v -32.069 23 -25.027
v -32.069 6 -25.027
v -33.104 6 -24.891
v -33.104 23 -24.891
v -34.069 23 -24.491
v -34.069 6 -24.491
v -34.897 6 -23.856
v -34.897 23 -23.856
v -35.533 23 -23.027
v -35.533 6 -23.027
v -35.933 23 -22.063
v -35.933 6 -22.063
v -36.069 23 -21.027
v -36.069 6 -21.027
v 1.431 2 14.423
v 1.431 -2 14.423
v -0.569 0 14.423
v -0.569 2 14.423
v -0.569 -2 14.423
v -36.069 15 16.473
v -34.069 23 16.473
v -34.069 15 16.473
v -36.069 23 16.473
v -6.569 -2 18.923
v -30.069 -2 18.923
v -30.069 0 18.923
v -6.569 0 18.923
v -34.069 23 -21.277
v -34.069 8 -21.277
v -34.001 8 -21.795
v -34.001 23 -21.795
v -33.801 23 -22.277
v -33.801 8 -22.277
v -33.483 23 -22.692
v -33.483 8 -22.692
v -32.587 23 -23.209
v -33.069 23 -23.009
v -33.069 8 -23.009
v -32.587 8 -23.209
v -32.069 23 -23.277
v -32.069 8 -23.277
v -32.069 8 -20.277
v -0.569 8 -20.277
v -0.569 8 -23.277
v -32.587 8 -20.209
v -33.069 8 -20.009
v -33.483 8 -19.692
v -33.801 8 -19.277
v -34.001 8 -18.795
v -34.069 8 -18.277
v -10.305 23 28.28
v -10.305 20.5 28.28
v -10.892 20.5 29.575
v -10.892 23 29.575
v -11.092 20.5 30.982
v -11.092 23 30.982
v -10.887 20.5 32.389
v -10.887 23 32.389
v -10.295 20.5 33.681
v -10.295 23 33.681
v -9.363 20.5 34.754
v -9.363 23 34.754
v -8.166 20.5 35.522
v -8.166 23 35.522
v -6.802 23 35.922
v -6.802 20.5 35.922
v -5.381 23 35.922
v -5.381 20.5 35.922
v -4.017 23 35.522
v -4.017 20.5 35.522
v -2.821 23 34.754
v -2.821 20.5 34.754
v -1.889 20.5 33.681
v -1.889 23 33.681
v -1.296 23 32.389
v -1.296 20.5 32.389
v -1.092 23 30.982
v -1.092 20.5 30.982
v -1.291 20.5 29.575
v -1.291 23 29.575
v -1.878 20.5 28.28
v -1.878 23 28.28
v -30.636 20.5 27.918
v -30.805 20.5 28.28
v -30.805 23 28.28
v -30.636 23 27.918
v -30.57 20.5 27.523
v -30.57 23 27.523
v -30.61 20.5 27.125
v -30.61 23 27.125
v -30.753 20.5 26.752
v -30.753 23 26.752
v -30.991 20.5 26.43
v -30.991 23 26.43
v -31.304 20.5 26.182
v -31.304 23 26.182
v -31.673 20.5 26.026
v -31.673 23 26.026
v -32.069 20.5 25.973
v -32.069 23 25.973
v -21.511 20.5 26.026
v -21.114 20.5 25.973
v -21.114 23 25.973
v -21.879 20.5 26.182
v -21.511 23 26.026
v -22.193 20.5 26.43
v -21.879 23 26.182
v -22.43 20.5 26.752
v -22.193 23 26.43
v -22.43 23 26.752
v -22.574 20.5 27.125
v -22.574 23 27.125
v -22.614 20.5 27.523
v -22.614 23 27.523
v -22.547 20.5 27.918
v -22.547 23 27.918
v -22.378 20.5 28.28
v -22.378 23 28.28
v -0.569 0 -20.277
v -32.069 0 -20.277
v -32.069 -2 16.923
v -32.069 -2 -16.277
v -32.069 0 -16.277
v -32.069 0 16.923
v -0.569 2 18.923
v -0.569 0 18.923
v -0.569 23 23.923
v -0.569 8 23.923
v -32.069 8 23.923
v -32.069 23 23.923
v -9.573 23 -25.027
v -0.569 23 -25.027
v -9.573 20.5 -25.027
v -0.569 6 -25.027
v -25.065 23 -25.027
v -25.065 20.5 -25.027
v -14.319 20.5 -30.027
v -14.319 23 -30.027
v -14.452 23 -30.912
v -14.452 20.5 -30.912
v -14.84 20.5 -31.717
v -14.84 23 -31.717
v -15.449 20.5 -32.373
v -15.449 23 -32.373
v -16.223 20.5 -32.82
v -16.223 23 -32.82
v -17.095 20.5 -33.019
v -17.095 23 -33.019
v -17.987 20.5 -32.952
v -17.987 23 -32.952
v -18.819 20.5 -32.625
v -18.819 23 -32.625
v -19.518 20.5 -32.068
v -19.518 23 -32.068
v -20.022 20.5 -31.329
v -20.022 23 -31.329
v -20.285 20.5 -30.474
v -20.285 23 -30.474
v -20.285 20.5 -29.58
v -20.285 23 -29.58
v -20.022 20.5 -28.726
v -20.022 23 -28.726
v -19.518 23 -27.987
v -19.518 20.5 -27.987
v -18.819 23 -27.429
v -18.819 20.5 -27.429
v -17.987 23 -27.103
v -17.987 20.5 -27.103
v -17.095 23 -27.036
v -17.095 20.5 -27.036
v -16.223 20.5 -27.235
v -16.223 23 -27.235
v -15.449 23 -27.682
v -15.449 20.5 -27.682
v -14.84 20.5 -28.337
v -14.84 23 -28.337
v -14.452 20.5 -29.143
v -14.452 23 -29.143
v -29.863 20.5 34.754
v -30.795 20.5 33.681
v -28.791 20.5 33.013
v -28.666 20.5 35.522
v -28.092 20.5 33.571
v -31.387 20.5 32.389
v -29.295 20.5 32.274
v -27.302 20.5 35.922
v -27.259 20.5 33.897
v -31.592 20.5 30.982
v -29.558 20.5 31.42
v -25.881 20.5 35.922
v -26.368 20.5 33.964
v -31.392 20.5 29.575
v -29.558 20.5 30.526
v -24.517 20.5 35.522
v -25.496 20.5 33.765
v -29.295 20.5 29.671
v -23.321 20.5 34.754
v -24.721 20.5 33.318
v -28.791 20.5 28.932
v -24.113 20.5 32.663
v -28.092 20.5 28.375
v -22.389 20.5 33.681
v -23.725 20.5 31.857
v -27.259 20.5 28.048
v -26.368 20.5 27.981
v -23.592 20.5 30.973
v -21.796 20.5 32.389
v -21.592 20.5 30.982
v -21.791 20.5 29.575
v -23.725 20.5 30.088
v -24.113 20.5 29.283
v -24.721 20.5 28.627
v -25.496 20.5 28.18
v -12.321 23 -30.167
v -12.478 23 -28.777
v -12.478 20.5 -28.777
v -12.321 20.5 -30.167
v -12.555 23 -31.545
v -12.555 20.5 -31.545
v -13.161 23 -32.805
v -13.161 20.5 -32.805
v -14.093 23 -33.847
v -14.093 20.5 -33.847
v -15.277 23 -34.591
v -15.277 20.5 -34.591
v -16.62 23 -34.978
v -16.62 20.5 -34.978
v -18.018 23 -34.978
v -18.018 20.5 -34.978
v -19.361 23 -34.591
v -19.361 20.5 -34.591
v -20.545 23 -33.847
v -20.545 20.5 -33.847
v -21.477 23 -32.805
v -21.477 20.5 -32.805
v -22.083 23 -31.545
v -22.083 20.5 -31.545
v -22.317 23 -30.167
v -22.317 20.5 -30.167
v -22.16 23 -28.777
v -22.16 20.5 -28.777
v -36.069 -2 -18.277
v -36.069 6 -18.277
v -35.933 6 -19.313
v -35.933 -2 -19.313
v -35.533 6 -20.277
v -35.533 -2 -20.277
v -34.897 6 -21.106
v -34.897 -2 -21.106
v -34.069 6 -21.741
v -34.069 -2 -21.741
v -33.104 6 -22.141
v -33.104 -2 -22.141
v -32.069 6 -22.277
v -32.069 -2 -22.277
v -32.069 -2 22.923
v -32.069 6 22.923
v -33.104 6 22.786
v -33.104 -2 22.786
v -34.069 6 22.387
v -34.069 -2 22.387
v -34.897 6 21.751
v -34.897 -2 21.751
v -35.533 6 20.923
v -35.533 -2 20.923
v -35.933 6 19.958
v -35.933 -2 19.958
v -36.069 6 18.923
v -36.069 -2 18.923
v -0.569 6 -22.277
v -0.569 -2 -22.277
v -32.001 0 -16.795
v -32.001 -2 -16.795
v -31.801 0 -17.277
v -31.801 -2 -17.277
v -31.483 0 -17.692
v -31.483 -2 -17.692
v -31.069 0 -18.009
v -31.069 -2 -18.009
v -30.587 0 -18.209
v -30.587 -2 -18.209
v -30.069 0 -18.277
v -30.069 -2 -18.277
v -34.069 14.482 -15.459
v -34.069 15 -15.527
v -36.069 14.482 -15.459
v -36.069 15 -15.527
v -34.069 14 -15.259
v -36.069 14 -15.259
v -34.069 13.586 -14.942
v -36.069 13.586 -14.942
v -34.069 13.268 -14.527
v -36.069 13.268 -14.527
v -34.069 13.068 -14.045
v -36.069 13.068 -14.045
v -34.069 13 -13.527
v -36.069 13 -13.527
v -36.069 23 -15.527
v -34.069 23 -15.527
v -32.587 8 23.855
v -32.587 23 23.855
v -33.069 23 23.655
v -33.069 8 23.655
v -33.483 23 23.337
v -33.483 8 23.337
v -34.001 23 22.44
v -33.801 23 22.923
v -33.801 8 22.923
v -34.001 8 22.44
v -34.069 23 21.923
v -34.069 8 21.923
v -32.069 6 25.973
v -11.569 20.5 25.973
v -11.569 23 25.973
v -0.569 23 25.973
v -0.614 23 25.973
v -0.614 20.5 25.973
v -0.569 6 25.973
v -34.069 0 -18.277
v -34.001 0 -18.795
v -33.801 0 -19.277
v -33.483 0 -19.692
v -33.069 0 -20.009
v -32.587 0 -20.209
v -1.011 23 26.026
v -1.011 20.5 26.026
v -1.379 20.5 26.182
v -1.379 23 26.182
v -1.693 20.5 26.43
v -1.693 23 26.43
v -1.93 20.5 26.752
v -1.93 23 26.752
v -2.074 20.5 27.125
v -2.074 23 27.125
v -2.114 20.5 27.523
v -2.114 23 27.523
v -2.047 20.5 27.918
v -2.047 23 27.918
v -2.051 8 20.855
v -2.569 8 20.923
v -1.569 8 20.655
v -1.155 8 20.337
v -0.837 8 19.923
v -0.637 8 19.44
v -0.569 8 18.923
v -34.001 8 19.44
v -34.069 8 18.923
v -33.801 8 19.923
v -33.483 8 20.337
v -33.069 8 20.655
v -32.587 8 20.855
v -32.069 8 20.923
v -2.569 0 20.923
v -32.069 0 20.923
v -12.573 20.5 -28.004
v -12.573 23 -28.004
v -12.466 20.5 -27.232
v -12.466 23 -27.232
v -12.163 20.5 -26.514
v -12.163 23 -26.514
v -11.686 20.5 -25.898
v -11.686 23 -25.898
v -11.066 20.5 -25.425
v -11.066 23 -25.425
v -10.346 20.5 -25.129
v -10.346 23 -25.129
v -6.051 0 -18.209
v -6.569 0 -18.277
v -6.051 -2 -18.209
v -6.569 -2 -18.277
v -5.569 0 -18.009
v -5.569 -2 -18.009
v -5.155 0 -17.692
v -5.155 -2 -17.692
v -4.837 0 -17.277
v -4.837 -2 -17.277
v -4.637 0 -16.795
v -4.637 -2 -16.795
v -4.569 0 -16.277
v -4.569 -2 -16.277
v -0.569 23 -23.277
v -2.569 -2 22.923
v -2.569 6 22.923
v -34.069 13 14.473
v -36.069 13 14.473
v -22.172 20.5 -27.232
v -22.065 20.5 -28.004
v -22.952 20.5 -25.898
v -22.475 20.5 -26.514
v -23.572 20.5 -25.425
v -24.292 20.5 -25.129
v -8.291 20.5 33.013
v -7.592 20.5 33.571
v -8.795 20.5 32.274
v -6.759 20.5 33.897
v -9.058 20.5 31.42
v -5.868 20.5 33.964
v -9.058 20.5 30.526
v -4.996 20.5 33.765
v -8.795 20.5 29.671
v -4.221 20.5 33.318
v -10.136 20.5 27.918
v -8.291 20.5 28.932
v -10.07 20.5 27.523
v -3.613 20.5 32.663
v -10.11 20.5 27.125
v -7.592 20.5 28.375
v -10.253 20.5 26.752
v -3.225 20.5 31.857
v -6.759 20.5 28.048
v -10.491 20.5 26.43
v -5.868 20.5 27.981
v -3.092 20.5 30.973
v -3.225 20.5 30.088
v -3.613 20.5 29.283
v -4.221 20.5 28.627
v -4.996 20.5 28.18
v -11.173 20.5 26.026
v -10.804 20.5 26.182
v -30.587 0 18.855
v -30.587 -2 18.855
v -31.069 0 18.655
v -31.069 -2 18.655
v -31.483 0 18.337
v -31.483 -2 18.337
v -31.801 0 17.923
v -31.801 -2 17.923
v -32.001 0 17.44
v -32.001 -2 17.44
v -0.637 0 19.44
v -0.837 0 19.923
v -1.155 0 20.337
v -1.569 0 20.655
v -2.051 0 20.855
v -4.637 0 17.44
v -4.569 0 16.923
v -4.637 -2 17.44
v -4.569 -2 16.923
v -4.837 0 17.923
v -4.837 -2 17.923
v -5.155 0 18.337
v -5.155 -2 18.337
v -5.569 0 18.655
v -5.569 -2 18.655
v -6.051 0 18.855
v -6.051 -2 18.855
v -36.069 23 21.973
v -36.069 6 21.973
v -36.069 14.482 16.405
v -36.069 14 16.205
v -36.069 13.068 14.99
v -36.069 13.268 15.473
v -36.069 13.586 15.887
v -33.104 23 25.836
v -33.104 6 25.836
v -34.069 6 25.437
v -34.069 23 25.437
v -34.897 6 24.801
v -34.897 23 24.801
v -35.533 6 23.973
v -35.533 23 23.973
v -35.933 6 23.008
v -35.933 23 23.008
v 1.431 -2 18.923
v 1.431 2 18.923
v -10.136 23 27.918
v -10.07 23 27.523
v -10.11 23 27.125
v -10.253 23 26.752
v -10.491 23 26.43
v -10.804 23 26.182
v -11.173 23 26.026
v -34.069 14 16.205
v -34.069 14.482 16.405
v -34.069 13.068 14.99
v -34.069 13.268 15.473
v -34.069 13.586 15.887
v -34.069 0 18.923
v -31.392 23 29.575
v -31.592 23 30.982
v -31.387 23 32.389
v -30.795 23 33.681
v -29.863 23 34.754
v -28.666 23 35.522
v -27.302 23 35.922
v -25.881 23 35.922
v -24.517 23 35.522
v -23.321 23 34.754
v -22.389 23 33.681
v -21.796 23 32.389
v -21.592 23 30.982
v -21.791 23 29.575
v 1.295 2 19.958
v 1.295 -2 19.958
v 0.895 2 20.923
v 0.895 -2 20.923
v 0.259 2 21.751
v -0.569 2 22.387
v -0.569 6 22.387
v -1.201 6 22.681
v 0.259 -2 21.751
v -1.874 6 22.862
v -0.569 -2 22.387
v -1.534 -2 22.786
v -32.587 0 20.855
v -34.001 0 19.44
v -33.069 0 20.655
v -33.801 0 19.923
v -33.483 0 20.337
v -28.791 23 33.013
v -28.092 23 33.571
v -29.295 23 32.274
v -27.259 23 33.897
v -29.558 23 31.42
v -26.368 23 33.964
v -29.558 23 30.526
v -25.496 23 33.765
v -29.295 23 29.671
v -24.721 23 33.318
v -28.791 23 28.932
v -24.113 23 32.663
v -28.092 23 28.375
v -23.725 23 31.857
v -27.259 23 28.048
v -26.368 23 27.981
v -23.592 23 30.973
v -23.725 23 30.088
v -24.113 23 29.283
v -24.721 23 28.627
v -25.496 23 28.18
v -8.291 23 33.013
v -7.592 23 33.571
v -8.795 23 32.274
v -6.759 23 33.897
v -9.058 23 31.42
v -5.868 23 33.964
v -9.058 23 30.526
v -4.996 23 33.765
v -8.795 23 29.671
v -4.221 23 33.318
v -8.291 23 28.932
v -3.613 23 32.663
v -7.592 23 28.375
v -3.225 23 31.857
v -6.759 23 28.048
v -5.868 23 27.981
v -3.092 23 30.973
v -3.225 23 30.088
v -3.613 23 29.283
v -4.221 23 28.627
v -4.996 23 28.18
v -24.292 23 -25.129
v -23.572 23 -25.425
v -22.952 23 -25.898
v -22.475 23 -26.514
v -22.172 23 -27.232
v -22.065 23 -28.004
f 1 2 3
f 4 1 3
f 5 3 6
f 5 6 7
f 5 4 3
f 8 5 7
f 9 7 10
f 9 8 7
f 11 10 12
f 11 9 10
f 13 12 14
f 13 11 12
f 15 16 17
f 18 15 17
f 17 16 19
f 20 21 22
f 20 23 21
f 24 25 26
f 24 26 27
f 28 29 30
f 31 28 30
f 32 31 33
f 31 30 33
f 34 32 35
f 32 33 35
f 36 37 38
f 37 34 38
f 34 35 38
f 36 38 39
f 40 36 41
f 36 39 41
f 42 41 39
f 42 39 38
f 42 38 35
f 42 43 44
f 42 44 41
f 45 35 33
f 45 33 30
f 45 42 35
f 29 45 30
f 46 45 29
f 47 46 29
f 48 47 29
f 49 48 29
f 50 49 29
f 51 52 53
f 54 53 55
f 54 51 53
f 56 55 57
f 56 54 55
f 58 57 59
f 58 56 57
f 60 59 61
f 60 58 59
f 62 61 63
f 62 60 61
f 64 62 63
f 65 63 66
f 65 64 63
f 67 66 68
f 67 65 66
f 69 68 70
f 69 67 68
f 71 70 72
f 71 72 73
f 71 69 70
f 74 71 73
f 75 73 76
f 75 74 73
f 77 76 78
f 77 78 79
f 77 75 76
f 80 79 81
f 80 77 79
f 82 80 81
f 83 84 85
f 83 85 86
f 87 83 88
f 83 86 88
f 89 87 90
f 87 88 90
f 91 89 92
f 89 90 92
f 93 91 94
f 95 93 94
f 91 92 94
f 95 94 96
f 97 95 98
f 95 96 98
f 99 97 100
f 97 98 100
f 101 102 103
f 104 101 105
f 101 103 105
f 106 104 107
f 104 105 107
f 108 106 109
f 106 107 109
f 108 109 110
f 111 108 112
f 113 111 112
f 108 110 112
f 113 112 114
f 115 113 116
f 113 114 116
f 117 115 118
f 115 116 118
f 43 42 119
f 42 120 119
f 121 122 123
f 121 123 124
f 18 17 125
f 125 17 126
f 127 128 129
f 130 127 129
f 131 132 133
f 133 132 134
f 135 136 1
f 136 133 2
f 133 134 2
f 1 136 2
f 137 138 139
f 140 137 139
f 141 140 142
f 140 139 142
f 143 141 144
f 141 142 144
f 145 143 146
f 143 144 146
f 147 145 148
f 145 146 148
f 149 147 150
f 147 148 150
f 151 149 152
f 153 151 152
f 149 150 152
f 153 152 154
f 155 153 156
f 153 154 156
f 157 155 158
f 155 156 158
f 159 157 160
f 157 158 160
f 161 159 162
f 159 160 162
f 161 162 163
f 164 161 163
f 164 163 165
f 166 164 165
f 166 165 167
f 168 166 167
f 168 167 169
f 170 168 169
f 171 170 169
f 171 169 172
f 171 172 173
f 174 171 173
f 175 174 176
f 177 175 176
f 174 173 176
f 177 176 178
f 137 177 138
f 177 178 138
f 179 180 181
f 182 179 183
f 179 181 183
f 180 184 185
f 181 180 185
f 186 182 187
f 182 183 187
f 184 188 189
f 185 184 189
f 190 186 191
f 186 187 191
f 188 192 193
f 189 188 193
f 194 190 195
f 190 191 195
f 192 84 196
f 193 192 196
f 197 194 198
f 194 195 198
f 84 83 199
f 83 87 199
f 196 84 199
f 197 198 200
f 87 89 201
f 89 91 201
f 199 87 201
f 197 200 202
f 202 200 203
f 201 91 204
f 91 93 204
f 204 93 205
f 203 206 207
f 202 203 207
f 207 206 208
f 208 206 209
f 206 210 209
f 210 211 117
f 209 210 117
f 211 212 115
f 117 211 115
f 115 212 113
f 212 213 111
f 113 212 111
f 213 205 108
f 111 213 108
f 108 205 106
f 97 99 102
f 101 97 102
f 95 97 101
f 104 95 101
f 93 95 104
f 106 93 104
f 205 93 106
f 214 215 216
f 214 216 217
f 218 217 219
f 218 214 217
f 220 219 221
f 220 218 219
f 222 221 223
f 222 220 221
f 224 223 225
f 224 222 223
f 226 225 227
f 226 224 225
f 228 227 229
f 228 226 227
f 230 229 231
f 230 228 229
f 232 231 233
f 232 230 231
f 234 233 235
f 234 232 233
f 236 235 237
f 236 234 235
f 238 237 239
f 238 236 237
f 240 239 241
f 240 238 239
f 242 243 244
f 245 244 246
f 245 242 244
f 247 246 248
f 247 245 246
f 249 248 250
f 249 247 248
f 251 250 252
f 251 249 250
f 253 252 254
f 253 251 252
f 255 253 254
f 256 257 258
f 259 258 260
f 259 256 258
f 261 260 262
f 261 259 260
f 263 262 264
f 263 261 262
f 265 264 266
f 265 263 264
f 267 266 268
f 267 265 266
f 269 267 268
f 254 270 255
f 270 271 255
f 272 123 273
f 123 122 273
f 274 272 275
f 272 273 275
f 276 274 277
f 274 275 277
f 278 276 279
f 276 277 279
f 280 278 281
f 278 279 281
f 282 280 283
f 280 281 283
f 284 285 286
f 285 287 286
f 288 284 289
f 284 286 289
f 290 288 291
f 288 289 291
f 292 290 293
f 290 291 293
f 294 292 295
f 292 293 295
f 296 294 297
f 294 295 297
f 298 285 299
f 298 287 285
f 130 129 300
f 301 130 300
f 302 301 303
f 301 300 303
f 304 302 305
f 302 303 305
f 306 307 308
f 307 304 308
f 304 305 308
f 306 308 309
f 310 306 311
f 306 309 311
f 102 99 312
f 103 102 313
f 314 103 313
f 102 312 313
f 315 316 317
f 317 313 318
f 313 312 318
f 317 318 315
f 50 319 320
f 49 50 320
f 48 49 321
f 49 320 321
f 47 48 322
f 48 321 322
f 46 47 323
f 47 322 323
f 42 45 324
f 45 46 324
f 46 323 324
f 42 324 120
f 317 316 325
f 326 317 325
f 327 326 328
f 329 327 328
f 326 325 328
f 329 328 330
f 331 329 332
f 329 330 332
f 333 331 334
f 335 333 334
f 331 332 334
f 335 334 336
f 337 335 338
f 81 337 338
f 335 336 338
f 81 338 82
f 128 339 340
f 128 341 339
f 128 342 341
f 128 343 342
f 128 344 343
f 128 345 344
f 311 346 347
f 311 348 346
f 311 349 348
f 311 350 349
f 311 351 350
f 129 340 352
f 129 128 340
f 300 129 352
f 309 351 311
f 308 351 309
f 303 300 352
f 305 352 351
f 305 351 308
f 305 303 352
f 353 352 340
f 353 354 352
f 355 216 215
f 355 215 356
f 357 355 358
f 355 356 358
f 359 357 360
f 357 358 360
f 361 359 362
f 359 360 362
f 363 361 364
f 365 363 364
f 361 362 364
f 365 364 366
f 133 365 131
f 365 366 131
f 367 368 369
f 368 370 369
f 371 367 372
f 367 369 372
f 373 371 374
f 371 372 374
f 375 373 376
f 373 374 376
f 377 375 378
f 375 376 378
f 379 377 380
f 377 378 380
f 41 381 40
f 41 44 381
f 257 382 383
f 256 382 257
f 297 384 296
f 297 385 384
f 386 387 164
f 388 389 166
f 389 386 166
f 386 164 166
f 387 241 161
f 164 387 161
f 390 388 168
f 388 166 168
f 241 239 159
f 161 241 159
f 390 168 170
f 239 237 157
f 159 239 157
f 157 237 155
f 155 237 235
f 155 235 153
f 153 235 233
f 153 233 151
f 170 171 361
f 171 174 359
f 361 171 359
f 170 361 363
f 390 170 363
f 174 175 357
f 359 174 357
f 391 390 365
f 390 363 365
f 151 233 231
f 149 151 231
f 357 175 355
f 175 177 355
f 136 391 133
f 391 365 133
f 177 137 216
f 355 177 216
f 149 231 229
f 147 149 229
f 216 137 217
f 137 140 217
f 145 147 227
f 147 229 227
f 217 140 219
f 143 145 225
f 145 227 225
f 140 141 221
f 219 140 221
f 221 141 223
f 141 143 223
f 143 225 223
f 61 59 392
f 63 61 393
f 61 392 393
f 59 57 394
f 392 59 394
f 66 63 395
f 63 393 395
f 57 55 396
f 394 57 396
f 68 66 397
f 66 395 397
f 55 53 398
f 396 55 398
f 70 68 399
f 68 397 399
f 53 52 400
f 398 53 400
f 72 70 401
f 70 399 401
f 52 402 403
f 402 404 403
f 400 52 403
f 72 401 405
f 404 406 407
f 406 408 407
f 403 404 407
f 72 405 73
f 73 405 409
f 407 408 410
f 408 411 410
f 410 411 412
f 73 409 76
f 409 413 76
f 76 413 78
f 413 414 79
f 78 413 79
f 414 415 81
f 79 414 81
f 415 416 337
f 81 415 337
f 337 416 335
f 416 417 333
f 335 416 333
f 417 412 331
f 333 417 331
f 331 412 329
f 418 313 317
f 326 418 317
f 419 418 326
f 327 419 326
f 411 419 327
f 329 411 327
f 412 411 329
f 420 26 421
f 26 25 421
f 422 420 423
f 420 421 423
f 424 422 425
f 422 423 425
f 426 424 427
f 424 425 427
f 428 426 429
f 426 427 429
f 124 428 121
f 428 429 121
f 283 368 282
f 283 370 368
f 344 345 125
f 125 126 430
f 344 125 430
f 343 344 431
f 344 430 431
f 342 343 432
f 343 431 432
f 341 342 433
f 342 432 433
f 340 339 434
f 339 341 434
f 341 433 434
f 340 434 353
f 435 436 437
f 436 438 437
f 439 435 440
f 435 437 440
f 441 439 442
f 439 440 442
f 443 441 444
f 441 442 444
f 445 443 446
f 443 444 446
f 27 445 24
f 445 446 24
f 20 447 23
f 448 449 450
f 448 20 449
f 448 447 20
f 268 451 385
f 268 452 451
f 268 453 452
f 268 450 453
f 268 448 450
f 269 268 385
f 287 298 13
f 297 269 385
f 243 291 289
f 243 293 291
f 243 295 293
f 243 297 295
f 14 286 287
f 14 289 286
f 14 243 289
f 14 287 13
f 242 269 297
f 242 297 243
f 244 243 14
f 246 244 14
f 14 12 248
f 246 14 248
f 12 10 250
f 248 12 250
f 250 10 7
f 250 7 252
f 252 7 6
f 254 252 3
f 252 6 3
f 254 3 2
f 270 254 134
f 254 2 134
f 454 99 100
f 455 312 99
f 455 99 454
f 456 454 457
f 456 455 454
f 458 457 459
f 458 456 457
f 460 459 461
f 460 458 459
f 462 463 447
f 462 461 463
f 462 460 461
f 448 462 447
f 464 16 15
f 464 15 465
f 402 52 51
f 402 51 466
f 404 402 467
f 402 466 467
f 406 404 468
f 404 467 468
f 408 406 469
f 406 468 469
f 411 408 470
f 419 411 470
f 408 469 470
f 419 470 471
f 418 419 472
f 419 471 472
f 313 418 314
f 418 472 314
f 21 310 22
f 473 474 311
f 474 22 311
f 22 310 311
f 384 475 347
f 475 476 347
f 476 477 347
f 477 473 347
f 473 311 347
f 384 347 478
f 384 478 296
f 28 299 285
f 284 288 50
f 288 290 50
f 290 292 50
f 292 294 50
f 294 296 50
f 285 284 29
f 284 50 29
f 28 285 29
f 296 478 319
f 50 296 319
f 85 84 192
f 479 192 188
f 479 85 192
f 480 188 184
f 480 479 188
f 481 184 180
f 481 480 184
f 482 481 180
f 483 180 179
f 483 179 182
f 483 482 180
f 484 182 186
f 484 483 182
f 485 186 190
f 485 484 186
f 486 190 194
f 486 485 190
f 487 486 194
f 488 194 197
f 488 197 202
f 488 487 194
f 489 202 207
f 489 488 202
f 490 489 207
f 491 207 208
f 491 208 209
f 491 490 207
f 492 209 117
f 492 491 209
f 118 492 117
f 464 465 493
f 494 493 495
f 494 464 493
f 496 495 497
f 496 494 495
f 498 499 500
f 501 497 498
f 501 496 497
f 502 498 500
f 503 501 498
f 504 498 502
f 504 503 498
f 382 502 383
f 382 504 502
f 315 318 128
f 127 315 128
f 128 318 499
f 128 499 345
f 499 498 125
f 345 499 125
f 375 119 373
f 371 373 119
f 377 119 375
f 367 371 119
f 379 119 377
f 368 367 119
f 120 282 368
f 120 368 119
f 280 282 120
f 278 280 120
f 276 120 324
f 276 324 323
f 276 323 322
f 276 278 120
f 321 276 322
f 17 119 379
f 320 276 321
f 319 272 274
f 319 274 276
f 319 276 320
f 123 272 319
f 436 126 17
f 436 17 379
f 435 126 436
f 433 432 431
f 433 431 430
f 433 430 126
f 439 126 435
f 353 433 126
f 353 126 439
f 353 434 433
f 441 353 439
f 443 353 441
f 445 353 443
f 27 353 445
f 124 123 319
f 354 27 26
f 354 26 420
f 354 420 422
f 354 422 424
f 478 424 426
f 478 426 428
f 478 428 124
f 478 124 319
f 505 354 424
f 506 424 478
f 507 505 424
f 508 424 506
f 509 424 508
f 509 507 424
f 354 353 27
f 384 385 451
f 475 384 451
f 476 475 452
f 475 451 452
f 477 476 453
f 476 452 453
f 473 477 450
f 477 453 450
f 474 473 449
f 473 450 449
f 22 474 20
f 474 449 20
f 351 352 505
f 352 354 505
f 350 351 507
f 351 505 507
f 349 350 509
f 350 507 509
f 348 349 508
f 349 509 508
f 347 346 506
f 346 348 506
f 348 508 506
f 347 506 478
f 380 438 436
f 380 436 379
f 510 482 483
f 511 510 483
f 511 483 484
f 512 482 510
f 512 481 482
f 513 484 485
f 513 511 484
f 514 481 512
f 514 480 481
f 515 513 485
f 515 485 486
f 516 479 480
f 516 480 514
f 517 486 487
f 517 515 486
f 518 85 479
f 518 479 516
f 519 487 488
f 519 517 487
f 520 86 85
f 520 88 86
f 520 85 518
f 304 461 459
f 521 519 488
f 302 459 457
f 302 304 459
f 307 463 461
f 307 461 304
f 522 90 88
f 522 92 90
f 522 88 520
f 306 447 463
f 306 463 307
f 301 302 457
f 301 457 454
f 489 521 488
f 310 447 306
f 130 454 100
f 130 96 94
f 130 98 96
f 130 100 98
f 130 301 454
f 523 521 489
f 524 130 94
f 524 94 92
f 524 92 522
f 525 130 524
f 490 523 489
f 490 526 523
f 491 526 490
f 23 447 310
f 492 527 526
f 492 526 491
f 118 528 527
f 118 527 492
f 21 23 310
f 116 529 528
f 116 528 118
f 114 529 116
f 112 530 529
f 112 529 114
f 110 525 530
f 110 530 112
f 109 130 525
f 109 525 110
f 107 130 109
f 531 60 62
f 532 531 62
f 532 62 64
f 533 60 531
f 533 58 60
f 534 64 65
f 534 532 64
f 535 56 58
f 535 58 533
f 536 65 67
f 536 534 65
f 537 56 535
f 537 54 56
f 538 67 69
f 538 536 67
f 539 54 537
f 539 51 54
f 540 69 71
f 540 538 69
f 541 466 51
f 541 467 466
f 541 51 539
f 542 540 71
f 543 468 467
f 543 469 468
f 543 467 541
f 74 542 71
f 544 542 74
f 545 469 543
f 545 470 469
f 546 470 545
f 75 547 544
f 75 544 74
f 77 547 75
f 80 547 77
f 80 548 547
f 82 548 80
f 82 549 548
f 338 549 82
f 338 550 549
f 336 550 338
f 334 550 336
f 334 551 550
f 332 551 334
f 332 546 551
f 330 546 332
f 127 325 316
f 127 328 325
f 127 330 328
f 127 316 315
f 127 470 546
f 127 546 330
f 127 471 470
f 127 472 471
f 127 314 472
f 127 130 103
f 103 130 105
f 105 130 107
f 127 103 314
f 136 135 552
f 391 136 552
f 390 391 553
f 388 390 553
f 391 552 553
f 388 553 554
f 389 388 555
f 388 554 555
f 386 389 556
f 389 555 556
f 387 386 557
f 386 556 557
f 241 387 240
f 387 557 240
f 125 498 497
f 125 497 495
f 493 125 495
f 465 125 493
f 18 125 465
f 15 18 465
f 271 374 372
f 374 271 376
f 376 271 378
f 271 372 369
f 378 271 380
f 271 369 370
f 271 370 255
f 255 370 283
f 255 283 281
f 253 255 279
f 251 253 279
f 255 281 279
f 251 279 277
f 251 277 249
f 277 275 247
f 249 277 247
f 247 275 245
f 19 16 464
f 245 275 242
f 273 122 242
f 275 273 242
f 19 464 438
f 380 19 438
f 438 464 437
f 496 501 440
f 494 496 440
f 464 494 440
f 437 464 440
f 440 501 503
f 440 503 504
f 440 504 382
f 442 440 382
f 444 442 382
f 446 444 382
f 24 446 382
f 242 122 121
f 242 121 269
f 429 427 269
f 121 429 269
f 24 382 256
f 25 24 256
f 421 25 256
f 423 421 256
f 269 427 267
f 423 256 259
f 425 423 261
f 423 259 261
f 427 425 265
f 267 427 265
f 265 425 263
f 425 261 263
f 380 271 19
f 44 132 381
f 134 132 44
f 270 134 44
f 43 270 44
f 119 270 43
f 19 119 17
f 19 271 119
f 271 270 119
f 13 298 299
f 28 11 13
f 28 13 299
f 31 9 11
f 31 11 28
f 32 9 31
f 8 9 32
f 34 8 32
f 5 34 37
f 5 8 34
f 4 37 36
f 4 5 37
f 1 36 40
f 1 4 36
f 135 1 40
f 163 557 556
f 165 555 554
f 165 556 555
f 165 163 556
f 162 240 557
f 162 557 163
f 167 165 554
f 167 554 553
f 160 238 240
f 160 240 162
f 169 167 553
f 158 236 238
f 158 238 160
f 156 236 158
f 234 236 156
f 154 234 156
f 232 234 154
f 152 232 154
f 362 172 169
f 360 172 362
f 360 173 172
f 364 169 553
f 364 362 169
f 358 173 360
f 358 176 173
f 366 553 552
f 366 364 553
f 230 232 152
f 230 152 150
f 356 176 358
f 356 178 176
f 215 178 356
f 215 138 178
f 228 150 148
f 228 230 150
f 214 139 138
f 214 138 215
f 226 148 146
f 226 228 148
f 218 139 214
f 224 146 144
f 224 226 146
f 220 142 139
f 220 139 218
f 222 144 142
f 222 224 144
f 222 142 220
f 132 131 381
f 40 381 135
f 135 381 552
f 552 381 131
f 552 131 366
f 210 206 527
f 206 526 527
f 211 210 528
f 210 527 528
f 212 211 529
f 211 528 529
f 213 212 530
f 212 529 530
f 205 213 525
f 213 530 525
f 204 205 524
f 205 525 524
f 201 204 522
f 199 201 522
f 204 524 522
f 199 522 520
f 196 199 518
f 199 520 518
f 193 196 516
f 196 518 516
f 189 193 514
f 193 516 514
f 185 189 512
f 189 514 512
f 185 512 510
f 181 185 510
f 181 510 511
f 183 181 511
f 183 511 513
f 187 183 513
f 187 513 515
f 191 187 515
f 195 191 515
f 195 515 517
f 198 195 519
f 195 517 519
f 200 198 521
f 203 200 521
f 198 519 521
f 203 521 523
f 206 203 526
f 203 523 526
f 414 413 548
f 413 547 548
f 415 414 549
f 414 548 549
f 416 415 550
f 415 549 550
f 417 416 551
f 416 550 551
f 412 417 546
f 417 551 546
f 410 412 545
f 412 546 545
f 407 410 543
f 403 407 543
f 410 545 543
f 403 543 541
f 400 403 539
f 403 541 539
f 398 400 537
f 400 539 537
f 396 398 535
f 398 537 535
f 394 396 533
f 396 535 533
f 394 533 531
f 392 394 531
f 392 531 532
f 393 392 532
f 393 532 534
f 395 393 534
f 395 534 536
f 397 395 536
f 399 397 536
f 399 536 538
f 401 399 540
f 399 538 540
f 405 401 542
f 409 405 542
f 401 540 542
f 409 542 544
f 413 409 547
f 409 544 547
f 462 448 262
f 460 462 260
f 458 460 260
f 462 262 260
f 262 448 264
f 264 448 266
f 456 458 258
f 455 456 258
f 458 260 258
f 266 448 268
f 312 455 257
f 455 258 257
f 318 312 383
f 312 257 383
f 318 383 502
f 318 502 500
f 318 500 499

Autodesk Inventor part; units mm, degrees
ref_plane "YZ Plane" through (0, 0, 0) normal (1, 0, 0) x (0, 1, 0)
ref_plane "XZ Plane" through (0, 0, 0) normal (0, 1, 0) x (-1, 0, 0)
sketch "Sketch1" plane through (0, 0, 0) normal (0, 1, 0) x (-1, 0, 0)
  arc A0 (31.569, 13.7227) -> (30.069, 12.2227) centre (31.569, 12.2227) ccw
  line L0 (31.569, 13.7227) -> (34.069, 13.7227)
  line L1 (34.069, 13.7227) -> (34.069, 18.9227)
  line L2 (32.069, 20.9227) -> (2.569, 20.9227)
  line L3 (34.069, -13.2773) -> (31.569, -13.2773)
  arc A1 (30.069, -11.7773) -> (31.569, -13.2773) centre (31.569, -11.7773) ccw
  arc A2 (34.069, 18.9227) -> (32.069, 20.9227) centre (32.069, 18.9227) ccw
  arc A3 (34.0195, 22.4149) -> (32.069, 23.9727) centre (32.069, 21.9727) ccw
  line L4 (32.069, 23.9727) -> (-23.931, 23.9727)
  arc A4 (-23.931, 23.9727) -> (-25.931, 21.9727) centre (-23.931, 21.9727) ccw
  line L5 (-25.931, 21.9727) -> (-25.931, -21.0273)
  arc A5 (-25.931, -21.0273) -> (-23.931, -23.0273) centre (-23.931, -21.0273) ccw
  line L6 (-23.931, -23.0273) -> (32.069, -23.0273)
  arc A6 (32.069, -23.0273) -> (33.899, -21.8341) centre (32.069, -21.0273) ccw
  arc A7 (32.069, -20.2773) -> (34.069, -18.2773) centre (32.069, -18.2773) ccw
  line L7 (32.069, -20.2773) -> (0.569, -20.2773)
  line L8 (34.069, -13.2773) -> (34.069, 13.7227)
  line L9 (0.569, -22.2773) -> (0.569, 18.9227)
  line L10 (30.069, -11.7773) -> (30.069, 12.2227)
  line L11 (34.069, -18.2773) -> (34.069, -13.2773)
  line L12 (2.569, 22.9227) -> (32.069, 22.9227)
  line L13 (0.569, -22.2773) -> (32.069, -22.2773)
  arc A8 (32.069, -22.2773) -> (36.069, -18.2773) centre (32.069, -18.2773) ccw
  line L14 (36.069, -18.2773) -> (36.069, 18.9227)
  arc A9 (2.569, 20.9227) -> (0.569, 18.9227) centre (2.569, 18.9227) ccw
  line L15 (-1.431, 14.4227) -> (-1.431, 18.9227)
  arc A10 (2.569, 22.9227) -> (-1.431, 18.9227) centre (2.569, 18.9227) ccw
  arc A11 (36.069, 18.9227) -> (32.069, 22.9227) centre (32.069, 18.9227) ccw
  line L16 (-1.431, 14.4227) -> (0.569, 14.4227)
  point P0 (0.569, 20.9227)
  dimension "d8" = 2
  dimension "d9" = 2
  dimension "d66" = 2
  dimension "d67" = 2
  dimension "d68" = 4.5
  dimension "d69" = 4
extrude "Extrusion3" add sketch "Sketch1" against normal blind 2 contours L0 L8 L3 A1 L10 A0 | A0 L10 A1 L3 L11 A7 L7 L9 A9 L2 A2 L1 L0 | L1 A2 L2 A9 L9 L16 L15 A10 L12 A11 L14 A8 L13 L7 A7 L11 L8
ref_plane "Work Plane1" through (0, 8, 0) normal (0, 1, 0) x (1, 0, 0)
extrude "Extrusion4" add sketch "Sketch1" along normal blind 8 contours L1 A2 L2 A9 L9 L16 L15 A10 L12 A11 L14 A8 L13 L7 A7 L11 L8
sketch "Sketch2" plane through (0, 8, 0) normal (0, 1, 0) x (1, 0, 0)
  line L0 (-0.569, 22.2773) -> (-0.569, 22.2773) projected
  line L1 (-0.569, 22.2773) -> (-0.569, 22.2773)
  line L2 (-36.069, -21.9727) -> (-36.069, 21.0273)
  line L3 (-32.069, -25.9727) -> (-0.569, -25.9727)
  line L4 (-0.569, -14.4227) -> (-0.569, -18.9227) projected
  line L5 (-0.569, -25.9727) -> (-0.569, -18.9227)
  line L6 (-0.569, -14.4227) -> (-0.569, 20.2773) projected
  line L7 (-0.569, 25.0273) -> (-32.069, 25.0273)
  line L8 (-0.569, 23.2773) -> (-32.069, 23.2773)
  line L9 (-32.069, 22.2773) -> (-0.569, 22.2773) projected
  arc A0 (-36.069, -21.9727) -> (-32.069, -25.9727) centre (-32.069, -21.9727) ccw
  line L10 (-0.569, -23.9227) -> (-32.069, -23.9227)
  line L11 (-34.069, -21.9227) -> (-34.069, 21.2773)
  line L12 (-34.069, 18.2773) -> (-34.069, -18.9227) projected
  arc A1 (-32.069, 23.2773) -> (-34.069, 21.2773) centre (-32.069, 21.2773) ccw
  arc A2 (-32.069, 25.0273) -> (-36.069, 21.0273) centre (-32.069, 21.0273) ccw
  arc A3 (-34.069, -21.9227) -> (-32.069, -23.9227) centre (-32.069, -21.9227) ccw
  line L13 (-34.069, -18.9227) -> (-34.069, 18.2773) projected
  line L14 (-36.069, 18.2773) -> (-36.069, -18.9227) projected
  line L15 (-32.069, 20.2773) -> (-0.569, 20.2773) projected
  line L16 (-2.569, -20.9227) -> (-32.069, -20.9227) projected
  line L17 (-32.069, -22.9227) -> (-2.569, -22.9227) projected
  line L18 (-0.569, 25.0273) -> (-0.569, 22.2773)
  line L19 (-0.569, 20.2773) -> (-0.569, 22.2773) projected
  line L20 (-0.569, 20.2773) -> (-32.069, 20.2773) projected
  arc A4 (-32.069, 20.2773) -> (-34.069, 18.2773) centre (-32.069, 18.2773) ccw projected
  line L21 (-34.069, 18.2773) -> (-34.069, -18.9227) projected
  arc A5 (-34.069, -18.9227) -> (-32.069, -20.9227) centre (-32.069, -18.9227) ccw projected
  line L22 (-32.069, -20.9227) -> (-2.569, -20.9227) projected
  arc A6 (-2.569, -20.9227) -> (-0.569, -18.9227) centre (-2.569, -18.9227) ccw projected
  line L23 (-0.569, -18.9227) -> (-0.569, -14.4227) projected
  line L24 (-0.569, -14.4227) -> (-0.569, 20.2773) projected
  dimension "d79" = 43
  dimension "d80" = 31.5
  dimension "d81" = 4
  dimension "d83" = 4.75
  dimension "d85" = 1
  dimension "d87" = 1
extrude "Extrusion7" add sketch "Sketch2" against normal blind 2 contours L2 A2 L7 L18 L8 A1 L11 A3 L10 L5 L3 A0 | L10 A3 L11 A5 L16 A6 L5 | L18 L19 L15 A4 L11 A1 L8
extrude "Extrusion8" add sketch "Sketch2" along normal blind 15 contours L2 A2 L7 L18 L8 A1 L11 A3 L10 L5 L3 A0
sketch "Sketch5" plane through (0, 23, 0) normal (0, 1, 0) x (1, 0, 0)
  circle A0 centre (-17.319, 30.0273) radius 5
  circle A1 centre (-17.319, 30.0273) radius 3
  arc A2 (-12.4777, 28.7773) -> (-9.573, 25.0273) centre (-9.573, 28.0273) ccw
  arc A3 (-25.0649, 25.0273) -> (-22.1602, 28.7773) centre (-25.0649, 28.0273) ccw
  circle A4 centre (-6.0917, -30.9727) radius 5
  circle A5 centre (-6.0917, -30.9727) radius 3
  arc A6 (-10.305, -28.2804) -> (-11.569, -25.9727) centre (-11.569, -27.4727) ccw
  arc A7 (-0.6145, -25.9727) -> (-1.8785, -28.2804) centre (-0.6145, -27.4727) ccw
  circle A8 centre (-26.5917, -30.9727) radius 5
  circle A9 centre (-26.5917, -30.9727) radius 3
  arc A10 (-21.1145, -25.9727) -> (-22.3785, -28.2804) centre (-21.1145, -27.4727) ccw
  line L0 (-11.569, -25.9727) -> (-0.6145, -25.9727)
  arc A11 (-30.805, -28.2804) -> (-32.069, -25.9727) centre (-32.069, -27.4727) ccw
  line L1 (-32.069, -25.9727) -> (-0.569, -25.9727) projected
  arc A12 (-36.069, -21.9727) -> (-32.069, -25.9727) centre (-32.069, -21.9727) ccw projected
  line L2 (-0.569, -22.3868) -> (-0.569, -25.9727) projected
  line L3 (-32.069, -25.9727) -> (-0.569, -25.9727)
  line L4 (-0.569, 25.0273) -> (-32.069, 25.0273) projected
  line L5 (-36.069, 21.0273) -> (-36.069, -21.9727) projected
  point P0 (0, 0)
  point P1 (-6.0917, -25.9727)
  point P2 (-26.5917, -25.9727)
  dimension "d34" = 10
  dimension "d35" = 6
  dimension "d38" = 3
  dimension "d39" = 3
  dimension "d40" = 10
  dimension "d41" = 6
  dimension "d42" = 3
  dimension "d43" = 3
  dimension "d44" = 10
  dimension "d45" = 6
  dimension "d47" = 3
  dimension "d49" = 20.5
  dimension "d88" = 3
  dimension "d89" = 18.75
extrude "Extrusion10" add sketch "Sketch5" against normal blind 2.5
sketch "Sketch6" plane through (0, -2, 0) normal (0, -1, 0) x (1, 0, 0)
  line L0 (-0.569, -22.2773) -> (-0.569, 14.4227) projected
  line L1 (-2.569, 22.9227) -> (-32.069, 22.9227) projected
  arc A0 (-32.069, 22.9227) -> (-36.069, 18.9227) centre (-32.069, 18.9227) ccw projected
  line L2 (-36.069, 18.9227) -> (-36.069, -18.2773) projected
  arc A1 (-36.069, -18.2773) -> (-32.069, -22.2773) centre (-32.069, -18.2773) ccw projected
  line L3 (-32.069, -22.2773) -> (-0.569, -22.2773) projected
  line L4 (-30.069, 18.9227) -> (-6.569, 18.9227)
  line L5 (-4.569, 16.9227) -> (-4.569, -16.2773)
  line L6 (-6.569, -18.2773) -> (-30.069, -18.2773)
  line L7 (-32.069, -16.2773) -> (-32.069, 16.9227)
  arc A2 (-6.569, -18.2773) -> (-4.569, -16.2773) centre (-6.569, -16.2773) ccw
  arc A3 (-32.069, -16.2773) -> (-30.069, -18.2773) centre (-30.069, -16.2773) ccw
  arc A4 (-30.069, 18.9227) -> (-32.069, 16.9227) centre (-30.069, 16.9227) ccw
  arc A5 (-4.569, 16.9227) -> (-6.569, 18.9227) centre (-6.569, 16.9227) ccw
  line L8 (-0.569, 14.4227) -> (1.431, 14.4227) projected
  line L9 (1.431, 14.4227) -> (1.431, 18.9227) projected
  arc A6 (1.431, 18.9227) -> (-2.569, 22.9227) centre (-2.569, 18.9227) ccw projected
  point P0 (0, 0)
  point P1 (-4.569, 18.9227)
  point P2 (-4.569, -18.2773)
  dimension "d52" = 4
  dimension "d53" = 37.2
  dimension "d54" = 27.5
  dimension "d55" = 4
  dimension "d56" = 2
extrude "Extrusion11" cut sketch "Sketch6" against normal blind 2 contours L4 A5 L5 A2 L6 A3 L7 A4
sketch "Sketch7" plane through (-36.069, -2, -18.2773) normal (-1, 0, 0) x (0, 0, 1)
  line L0 (2.75, 25) -> (34.75, 25)
  line L1 (34.75, 25) -> (34.75, 17)
  line L2 (32.75, 15) -> (4.75, 15)
  line L3 (2.75, 17) -> (2.75, 25)
  arc A0 (2.75, 17) -> (4.75, 15) centre (4.75, 17) ccw
  arc A1 (32.75, 15) -> (34.75, 17) centre (32.75, 17) ccw
  line L4 (40.25, 8) -> (40.25, 25) projected
  line L5 (-2.75, 25) -> (40.25, 25) projected
  point P0 (18.2773, 2)
  point P1 (34.75, 21)
  dimension "d59" = 2
  dimension "d61" = 32
  dimension "d90" = 5.5
  dimension "d91" = 10
extrude "Extrusion12" cut sketch "Sketch7" against normal blind 6
sketch "Sketch8" plane through (0, 8, 0) normal (0, 1, 0) x (1, 0, 0)
  line L0 (-0.569, -14.4227) -> (-0.569, -18.9227) projected
  line L1 (1.431, -14.4227) -> (-0.569, -14.4227) projected
  line L2 (1.431, -18.9227) -> (1.431, -14.4227) projected
  arc A0 (-0.569, -22.3868) -> (1.431, -18.9227) centre (-2.569, -18.9227) ccw projected
  line L3 (-0.569, -23.9727) -> (-0.569, -18.9227) projected
  point P0 (0, 0)
  point P1 (-0.4025, -22.2852)
  point P2 (-0.4025, -22.2852)
  point P3 (-2.569, -22.9227)
  point P4 (-0.569, -22.3868)
extrude "Extrusion13" cut sketch "Sketch8" against normal blind 6
equation "\"shrink\" = 0.25"
properties part number "CO-1-06-motorControllersMount"
